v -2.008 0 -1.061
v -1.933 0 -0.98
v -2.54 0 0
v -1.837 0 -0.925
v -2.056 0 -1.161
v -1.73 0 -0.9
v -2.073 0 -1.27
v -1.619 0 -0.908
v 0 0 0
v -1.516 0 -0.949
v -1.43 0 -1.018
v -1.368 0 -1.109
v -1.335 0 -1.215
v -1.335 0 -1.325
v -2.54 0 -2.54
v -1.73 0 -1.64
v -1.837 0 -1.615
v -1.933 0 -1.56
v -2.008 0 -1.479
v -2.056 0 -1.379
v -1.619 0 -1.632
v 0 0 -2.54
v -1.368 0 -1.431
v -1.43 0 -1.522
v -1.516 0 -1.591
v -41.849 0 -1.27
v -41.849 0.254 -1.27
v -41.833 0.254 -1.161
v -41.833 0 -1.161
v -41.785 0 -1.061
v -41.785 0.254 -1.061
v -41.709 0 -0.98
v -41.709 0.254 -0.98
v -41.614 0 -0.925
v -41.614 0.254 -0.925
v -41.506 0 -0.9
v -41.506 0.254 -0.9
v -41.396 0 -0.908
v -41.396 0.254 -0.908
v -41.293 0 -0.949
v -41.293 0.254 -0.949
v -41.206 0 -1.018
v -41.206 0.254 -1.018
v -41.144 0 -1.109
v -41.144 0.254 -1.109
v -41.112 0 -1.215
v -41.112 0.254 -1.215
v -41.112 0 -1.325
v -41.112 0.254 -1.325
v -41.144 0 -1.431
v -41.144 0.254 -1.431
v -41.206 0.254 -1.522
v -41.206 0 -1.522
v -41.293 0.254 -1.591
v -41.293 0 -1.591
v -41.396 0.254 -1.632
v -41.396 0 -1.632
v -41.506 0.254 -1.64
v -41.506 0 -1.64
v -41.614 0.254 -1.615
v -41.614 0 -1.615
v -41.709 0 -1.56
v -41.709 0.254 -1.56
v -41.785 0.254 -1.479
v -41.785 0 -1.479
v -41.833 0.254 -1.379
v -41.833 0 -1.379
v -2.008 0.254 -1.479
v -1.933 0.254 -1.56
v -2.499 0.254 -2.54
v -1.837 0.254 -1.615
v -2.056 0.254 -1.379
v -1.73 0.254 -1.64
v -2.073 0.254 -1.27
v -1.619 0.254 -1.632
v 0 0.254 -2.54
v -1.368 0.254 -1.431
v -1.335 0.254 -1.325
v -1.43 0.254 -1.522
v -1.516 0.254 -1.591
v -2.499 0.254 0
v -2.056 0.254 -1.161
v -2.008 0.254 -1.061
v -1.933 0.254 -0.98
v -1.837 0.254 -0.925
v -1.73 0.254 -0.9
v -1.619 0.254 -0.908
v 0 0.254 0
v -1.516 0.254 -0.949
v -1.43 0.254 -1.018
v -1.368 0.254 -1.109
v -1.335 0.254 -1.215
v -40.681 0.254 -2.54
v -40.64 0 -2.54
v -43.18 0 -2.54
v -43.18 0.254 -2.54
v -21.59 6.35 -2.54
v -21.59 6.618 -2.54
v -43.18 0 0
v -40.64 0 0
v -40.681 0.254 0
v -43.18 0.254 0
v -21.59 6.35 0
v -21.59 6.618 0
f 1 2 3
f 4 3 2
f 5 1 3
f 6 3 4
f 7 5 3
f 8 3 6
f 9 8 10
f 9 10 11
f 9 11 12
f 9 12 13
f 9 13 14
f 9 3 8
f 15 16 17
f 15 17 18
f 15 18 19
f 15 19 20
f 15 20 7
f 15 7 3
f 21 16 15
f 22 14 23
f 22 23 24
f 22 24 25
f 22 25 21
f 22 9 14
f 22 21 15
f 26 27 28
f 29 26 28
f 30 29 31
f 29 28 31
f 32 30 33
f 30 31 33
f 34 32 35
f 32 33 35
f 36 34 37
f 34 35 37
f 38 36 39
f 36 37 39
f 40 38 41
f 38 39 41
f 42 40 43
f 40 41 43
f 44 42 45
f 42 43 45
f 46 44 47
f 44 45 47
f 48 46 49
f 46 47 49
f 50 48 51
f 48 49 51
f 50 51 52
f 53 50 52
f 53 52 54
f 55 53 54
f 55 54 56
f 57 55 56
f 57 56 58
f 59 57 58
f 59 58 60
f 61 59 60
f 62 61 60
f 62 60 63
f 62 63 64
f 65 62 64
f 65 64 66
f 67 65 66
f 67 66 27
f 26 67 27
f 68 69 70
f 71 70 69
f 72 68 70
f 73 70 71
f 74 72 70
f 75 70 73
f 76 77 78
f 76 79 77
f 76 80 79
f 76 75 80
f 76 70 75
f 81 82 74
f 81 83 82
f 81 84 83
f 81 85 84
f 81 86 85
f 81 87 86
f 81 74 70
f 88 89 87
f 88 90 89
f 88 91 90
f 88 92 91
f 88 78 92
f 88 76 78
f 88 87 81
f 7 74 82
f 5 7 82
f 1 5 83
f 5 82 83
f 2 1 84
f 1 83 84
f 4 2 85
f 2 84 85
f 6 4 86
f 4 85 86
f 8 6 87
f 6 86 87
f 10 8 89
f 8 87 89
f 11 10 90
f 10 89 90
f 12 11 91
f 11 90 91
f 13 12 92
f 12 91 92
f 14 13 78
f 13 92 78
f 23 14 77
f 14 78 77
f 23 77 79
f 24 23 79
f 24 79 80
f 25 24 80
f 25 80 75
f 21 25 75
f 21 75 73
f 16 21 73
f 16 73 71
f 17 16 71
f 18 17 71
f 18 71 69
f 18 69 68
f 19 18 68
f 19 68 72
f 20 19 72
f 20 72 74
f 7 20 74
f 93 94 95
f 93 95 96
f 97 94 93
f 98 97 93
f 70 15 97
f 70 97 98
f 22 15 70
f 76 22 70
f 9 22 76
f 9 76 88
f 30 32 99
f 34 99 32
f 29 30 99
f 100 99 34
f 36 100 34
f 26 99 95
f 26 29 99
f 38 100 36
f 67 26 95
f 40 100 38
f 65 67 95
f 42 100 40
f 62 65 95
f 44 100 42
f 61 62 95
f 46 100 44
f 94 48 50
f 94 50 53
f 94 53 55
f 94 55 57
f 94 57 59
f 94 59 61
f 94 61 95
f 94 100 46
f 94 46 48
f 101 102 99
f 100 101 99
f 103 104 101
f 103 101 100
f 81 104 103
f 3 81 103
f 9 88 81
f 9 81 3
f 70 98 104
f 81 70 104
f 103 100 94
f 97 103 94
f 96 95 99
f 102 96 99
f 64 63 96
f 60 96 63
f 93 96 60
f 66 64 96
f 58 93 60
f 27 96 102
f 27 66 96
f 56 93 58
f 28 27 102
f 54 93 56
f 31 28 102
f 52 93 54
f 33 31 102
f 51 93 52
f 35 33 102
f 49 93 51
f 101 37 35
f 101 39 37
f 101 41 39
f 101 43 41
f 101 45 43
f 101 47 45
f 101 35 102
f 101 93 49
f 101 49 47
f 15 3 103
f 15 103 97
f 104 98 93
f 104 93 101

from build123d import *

# Parameters (mm, degrees)
SKETCH7_W                    = 2.54
SKETCH7_H                    = 0.254
F_69_0_0292_DIAMETER_HOLE1_D = 0.74168


with BuildPart() as part:
    # Sweep2: sweep along a path in Sketch1
    with BuildLine(Plane.XY) as sweep2_path:
        Line((-43.18, 0), (-40.64, 0))
        Line((-40.64, 0), (-21.59, 6.35))
        Line((-21.59, 6.35), (-2.54, 0))
        Line((-2.54, 0), (0, 0))
    # Sketch7 → Sweep2 (sweep)
    with BuildSketch(Plane(origin=(0, 0, 0), x_dir=(0, 0, -1), z_dir=(1, 0, 0))):
        with Locations((1.27, 0.127)):
            Rectangle(SKETCH7_W, SKETCH7_H)
    sweep(path=sweep2_path.line, transition=Transition.RIGHT)

    # #69 (0.0292) Diameter Hole1 (through all)
    with Locations(Plane.XZ):
        with Locations((-41.4782, -1.27), (-1.7018, -1.27)):
            Hole(F_69_0_0292_DIAMETER_HOLE1_D / 2)


solid = part.part
